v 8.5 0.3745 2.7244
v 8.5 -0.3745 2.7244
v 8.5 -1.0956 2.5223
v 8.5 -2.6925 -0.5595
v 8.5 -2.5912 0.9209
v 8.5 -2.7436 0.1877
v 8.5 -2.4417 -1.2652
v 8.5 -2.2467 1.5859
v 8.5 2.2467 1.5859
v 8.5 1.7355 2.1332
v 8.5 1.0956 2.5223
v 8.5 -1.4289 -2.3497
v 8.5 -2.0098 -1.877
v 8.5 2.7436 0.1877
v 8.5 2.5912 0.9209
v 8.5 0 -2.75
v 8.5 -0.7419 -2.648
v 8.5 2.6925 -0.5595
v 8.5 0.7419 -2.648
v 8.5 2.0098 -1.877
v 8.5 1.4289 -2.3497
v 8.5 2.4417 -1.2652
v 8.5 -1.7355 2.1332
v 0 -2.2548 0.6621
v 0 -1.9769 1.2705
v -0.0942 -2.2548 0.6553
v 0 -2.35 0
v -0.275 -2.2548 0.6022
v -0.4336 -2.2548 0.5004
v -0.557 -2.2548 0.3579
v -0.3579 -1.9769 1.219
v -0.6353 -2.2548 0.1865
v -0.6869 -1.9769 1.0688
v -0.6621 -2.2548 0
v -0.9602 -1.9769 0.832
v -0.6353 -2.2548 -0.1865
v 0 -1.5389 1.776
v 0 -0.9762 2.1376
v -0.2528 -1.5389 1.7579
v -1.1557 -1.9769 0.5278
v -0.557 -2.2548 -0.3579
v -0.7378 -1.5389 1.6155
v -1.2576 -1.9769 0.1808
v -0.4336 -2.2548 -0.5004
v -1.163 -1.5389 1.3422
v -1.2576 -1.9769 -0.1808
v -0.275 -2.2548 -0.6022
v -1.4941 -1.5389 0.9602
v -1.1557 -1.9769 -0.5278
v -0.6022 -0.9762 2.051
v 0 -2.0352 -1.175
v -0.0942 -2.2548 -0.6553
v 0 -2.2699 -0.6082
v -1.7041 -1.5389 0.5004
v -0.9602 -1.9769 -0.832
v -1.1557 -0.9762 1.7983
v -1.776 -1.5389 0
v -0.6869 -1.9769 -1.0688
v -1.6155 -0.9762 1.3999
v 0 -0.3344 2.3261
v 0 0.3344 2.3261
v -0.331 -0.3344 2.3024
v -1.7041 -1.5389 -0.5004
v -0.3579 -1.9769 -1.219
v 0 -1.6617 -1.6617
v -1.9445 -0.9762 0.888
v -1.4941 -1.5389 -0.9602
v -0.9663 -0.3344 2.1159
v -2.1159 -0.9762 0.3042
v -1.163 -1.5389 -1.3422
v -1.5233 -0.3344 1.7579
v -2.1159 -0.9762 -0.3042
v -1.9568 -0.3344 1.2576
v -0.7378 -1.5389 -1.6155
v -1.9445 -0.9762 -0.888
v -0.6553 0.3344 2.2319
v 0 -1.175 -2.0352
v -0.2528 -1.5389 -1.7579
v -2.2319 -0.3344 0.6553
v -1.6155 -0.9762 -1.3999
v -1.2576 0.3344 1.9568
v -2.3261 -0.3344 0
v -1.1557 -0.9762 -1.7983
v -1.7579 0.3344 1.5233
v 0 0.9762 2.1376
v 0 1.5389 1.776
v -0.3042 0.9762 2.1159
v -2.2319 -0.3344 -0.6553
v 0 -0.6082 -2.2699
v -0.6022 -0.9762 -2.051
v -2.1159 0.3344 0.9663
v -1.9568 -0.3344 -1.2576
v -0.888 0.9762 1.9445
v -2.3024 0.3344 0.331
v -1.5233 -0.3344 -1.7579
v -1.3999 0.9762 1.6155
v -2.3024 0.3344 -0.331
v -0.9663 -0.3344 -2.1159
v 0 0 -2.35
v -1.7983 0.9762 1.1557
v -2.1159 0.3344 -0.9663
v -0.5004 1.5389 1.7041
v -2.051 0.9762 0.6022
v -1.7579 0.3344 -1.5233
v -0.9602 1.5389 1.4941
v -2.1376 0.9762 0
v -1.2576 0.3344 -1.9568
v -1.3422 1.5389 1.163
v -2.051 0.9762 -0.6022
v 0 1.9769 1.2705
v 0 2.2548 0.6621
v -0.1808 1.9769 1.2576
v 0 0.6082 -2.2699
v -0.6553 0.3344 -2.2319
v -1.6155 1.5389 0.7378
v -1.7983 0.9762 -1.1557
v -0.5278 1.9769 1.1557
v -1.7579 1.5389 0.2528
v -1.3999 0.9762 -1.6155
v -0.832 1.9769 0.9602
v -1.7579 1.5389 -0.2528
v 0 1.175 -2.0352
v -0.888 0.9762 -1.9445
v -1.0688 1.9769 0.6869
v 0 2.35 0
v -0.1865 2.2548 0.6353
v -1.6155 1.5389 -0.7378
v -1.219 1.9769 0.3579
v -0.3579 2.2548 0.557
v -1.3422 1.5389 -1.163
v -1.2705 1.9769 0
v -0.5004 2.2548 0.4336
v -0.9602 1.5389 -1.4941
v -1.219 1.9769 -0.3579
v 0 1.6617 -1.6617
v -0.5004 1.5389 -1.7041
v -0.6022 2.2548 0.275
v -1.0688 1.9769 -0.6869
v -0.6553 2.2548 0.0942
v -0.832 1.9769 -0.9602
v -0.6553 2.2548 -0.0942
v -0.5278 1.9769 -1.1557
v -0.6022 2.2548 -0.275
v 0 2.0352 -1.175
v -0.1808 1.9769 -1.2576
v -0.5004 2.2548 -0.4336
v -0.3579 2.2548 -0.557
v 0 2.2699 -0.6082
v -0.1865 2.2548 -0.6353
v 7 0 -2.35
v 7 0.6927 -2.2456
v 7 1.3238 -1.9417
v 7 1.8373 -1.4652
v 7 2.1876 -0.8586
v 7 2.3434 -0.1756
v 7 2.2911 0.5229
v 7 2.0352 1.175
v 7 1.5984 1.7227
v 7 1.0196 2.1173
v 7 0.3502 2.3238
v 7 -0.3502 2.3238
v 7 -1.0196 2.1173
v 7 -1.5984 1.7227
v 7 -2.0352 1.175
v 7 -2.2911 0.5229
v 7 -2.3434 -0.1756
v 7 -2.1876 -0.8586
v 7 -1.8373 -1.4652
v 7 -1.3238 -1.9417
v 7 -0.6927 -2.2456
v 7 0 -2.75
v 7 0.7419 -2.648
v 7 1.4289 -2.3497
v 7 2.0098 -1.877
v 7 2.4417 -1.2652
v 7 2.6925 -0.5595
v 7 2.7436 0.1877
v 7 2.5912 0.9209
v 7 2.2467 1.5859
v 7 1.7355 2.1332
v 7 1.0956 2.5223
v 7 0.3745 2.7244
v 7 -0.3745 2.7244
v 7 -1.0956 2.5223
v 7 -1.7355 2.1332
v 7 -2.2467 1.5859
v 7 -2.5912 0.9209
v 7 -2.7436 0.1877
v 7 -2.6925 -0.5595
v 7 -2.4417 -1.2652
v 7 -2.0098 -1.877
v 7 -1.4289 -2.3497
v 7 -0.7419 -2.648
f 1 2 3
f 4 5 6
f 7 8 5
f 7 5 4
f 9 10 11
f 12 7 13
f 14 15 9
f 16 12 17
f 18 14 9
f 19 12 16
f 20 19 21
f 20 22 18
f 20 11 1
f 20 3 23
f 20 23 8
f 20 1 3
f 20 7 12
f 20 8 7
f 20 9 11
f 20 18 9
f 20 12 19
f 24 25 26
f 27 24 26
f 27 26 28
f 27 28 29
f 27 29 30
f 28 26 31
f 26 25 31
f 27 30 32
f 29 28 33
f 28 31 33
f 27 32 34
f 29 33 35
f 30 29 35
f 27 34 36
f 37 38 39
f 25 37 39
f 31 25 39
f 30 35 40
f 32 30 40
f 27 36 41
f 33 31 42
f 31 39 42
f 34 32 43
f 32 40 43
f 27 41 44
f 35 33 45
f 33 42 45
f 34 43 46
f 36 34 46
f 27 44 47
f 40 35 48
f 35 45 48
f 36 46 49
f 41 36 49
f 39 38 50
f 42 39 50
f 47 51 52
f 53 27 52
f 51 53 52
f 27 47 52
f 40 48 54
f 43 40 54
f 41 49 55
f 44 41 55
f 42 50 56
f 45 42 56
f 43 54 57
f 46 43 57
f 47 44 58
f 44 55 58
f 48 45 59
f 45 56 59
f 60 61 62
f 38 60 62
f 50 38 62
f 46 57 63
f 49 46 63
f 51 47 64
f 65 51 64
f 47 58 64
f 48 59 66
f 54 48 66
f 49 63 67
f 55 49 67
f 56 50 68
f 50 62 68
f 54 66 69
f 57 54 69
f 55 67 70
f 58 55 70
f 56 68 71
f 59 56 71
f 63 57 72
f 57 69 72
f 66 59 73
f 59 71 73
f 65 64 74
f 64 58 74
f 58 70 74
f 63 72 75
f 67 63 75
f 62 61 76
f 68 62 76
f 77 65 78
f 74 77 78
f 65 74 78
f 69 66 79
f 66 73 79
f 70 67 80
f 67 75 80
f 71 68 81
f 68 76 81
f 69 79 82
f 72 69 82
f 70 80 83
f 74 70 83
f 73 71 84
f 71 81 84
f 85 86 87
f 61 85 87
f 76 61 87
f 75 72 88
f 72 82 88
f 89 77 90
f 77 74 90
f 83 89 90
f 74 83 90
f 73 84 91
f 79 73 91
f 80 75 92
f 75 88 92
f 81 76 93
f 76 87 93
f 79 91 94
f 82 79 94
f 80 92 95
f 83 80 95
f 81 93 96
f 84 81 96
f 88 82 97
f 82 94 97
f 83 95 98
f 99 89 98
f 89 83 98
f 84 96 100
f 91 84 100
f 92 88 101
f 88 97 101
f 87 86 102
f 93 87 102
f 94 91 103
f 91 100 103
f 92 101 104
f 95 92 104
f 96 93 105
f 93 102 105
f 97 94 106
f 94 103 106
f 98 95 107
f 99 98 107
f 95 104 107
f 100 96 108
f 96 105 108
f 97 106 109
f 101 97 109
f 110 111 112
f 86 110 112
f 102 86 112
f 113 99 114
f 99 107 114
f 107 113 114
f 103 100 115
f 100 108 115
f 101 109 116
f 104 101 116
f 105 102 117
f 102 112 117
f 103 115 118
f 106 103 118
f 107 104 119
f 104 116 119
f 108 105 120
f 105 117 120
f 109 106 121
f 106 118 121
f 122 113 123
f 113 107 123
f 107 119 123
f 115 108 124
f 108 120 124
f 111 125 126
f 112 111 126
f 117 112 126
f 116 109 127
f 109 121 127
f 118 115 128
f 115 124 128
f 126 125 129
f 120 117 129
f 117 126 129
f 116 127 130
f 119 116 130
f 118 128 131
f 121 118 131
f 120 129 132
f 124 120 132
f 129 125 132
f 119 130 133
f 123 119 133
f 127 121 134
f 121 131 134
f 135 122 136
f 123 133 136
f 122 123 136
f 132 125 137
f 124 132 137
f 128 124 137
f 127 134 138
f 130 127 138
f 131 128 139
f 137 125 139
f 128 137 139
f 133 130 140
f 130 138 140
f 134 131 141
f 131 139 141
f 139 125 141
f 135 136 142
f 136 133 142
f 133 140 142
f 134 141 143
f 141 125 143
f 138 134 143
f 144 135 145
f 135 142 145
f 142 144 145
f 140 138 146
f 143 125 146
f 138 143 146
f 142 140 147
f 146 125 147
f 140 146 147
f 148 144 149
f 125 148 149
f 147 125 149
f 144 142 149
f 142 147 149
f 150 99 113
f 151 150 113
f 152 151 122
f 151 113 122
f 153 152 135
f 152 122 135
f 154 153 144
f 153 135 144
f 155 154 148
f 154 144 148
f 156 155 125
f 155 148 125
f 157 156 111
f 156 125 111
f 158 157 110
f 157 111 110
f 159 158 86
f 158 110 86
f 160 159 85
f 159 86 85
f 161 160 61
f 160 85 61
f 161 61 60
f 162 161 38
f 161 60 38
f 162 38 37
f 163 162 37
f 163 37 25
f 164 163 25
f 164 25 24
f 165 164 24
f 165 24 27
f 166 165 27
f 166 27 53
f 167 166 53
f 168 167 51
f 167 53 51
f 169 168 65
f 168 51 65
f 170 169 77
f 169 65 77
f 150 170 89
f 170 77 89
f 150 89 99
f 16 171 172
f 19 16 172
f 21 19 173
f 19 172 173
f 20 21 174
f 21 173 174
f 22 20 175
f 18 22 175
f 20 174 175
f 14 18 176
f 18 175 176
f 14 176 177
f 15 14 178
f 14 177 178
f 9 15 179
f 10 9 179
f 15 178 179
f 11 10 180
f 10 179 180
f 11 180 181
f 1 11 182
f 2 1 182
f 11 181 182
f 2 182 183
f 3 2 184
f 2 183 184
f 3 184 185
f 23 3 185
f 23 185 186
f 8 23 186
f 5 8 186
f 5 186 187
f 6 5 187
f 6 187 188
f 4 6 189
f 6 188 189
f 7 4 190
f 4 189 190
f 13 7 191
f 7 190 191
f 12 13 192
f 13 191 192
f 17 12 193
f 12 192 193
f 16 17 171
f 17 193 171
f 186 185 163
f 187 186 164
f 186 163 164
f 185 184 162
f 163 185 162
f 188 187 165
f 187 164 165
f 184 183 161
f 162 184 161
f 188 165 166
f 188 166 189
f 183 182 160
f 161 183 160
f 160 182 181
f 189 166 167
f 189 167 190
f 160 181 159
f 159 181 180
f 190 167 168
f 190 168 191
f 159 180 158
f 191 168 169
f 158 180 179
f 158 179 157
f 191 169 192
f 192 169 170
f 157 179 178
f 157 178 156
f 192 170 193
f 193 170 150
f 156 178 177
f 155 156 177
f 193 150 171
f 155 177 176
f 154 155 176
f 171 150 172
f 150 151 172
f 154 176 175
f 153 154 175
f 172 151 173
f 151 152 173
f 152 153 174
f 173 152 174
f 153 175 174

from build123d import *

# Parameters (mm, degrees)
SKETCH1_R           = 2.35
BOSS_EXTRUDE1_DEPTH = 7
SKETCH2_R           = 2.75
BOSS_EXTRUDE2_DEPTH = 1.5


with BuildPart() as part:
    # Sketch1 → Boss-Extrude1 (new body)
    with BuildSketch(Plane(origin=(0, 0, 0), x_dir=(0, 0, -1), z_dir=(1, 0, 0))):
        Circle(SKETCH1_R)
    extrude(amount=BOSS_EXTRUDE1_DEPTH)

    # Sketch2 → Boss-Extrude2 (add)
    with BuildSketch(Plane(origin=(7, 0, 0), x_dir=(0, 0, -1), z_dir=(1, 0, 0))):
        Circle(SKETCH2_R)
    extrude(amount=BOSS_EXTRUDE2_DEPTH)

    # Sketch15 → Revolve1 (revolve)
    with BuildSketch(Plane.XY):
        with BuildLine():
            Line((0, 2.35), (0, -2.35))
            ThreePointArc((0, -2.35), (-2.35, 0), (0, 2.35))
        make_face()
    revolve(axis=Axis((0, 2.35, 0), (0, -1, 0)))


solid = part.part
